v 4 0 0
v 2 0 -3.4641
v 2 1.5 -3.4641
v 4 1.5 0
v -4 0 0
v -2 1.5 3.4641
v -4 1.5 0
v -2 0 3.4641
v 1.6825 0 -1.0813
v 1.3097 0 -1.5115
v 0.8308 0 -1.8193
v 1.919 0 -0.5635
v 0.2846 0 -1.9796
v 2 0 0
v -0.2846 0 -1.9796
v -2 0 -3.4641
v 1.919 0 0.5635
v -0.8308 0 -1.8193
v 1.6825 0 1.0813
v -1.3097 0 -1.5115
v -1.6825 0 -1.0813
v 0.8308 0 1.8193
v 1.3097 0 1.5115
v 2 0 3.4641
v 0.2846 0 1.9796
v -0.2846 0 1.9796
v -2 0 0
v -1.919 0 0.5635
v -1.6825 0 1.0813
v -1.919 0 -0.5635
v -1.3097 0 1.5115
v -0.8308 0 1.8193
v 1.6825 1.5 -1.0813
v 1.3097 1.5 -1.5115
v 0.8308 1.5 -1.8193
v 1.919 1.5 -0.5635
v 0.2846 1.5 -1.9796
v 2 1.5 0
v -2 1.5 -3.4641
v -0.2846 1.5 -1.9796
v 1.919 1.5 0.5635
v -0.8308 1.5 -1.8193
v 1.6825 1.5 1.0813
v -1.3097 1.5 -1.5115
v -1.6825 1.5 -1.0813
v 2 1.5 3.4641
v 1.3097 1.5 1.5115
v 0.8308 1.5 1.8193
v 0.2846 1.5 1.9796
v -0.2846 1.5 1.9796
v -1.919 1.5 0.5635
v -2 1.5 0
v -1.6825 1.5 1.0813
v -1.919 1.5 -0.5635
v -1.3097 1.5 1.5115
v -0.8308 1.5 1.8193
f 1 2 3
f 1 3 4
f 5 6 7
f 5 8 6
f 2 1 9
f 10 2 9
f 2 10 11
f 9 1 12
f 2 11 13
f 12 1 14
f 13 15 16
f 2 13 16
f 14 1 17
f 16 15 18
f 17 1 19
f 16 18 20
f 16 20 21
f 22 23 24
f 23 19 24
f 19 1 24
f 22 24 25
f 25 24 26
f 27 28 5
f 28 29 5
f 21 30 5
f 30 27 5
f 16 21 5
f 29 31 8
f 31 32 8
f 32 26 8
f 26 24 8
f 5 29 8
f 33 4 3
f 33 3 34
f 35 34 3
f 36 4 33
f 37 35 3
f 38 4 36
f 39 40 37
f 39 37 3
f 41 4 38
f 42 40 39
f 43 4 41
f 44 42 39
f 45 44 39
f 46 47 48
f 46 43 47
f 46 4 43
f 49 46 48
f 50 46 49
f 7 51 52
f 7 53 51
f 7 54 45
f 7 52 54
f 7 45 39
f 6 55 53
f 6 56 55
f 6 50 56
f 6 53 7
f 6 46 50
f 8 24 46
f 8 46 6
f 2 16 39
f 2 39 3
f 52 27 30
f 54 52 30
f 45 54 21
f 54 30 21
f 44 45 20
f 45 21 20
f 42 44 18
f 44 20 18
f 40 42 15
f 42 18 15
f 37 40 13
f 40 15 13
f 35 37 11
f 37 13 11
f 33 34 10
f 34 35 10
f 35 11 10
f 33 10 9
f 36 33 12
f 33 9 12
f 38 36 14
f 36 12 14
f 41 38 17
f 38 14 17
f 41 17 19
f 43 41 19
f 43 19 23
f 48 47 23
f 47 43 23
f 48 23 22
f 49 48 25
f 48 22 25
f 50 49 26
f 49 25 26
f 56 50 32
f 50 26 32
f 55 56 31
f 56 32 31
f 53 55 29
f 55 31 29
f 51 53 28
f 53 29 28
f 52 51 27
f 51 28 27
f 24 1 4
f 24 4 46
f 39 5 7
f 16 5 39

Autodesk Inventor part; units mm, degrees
ref_plane "YZ Plane" through (0, 0, 0) normal (1, 0, 0) x (0, 1, 0)
ref_plane "XZ Plane" through (0, 0, 0) normal (0, 1, 0) x (-1, 0, 0)
ref_plane "XY Plane" through (0, 0, 0) normal (0, 0, 1) x (1, 0, 0)
sketch "草图1" plane through (0, 0, 0) normal (0, 1, 0) x (-1, 0, 0)
  circle A0 centre (0, 0) radius 2
  line L0 (4, 0) -> (2, -3.4641)
  line L1 (2, -3.4641) -> (-2, -3.4641)
  line L2 (-2, -3.4641) -> (-4, 0)
  line L3 (-4, 0) -> (-2, 3.4641)
  line L4 (-2, 3.4641) -> (2, 3.4641)
  line L5 (2, 3.4641) -> (4, 0)
  dimension "d0" = 4
extrude "拉伸2" add sketch "草图1" along normal blind 1.5
thread "螺纹2" size "M4x0.7" class "6H" standard "ANSI Metric M Profile" full length
properties part number "螺母"
